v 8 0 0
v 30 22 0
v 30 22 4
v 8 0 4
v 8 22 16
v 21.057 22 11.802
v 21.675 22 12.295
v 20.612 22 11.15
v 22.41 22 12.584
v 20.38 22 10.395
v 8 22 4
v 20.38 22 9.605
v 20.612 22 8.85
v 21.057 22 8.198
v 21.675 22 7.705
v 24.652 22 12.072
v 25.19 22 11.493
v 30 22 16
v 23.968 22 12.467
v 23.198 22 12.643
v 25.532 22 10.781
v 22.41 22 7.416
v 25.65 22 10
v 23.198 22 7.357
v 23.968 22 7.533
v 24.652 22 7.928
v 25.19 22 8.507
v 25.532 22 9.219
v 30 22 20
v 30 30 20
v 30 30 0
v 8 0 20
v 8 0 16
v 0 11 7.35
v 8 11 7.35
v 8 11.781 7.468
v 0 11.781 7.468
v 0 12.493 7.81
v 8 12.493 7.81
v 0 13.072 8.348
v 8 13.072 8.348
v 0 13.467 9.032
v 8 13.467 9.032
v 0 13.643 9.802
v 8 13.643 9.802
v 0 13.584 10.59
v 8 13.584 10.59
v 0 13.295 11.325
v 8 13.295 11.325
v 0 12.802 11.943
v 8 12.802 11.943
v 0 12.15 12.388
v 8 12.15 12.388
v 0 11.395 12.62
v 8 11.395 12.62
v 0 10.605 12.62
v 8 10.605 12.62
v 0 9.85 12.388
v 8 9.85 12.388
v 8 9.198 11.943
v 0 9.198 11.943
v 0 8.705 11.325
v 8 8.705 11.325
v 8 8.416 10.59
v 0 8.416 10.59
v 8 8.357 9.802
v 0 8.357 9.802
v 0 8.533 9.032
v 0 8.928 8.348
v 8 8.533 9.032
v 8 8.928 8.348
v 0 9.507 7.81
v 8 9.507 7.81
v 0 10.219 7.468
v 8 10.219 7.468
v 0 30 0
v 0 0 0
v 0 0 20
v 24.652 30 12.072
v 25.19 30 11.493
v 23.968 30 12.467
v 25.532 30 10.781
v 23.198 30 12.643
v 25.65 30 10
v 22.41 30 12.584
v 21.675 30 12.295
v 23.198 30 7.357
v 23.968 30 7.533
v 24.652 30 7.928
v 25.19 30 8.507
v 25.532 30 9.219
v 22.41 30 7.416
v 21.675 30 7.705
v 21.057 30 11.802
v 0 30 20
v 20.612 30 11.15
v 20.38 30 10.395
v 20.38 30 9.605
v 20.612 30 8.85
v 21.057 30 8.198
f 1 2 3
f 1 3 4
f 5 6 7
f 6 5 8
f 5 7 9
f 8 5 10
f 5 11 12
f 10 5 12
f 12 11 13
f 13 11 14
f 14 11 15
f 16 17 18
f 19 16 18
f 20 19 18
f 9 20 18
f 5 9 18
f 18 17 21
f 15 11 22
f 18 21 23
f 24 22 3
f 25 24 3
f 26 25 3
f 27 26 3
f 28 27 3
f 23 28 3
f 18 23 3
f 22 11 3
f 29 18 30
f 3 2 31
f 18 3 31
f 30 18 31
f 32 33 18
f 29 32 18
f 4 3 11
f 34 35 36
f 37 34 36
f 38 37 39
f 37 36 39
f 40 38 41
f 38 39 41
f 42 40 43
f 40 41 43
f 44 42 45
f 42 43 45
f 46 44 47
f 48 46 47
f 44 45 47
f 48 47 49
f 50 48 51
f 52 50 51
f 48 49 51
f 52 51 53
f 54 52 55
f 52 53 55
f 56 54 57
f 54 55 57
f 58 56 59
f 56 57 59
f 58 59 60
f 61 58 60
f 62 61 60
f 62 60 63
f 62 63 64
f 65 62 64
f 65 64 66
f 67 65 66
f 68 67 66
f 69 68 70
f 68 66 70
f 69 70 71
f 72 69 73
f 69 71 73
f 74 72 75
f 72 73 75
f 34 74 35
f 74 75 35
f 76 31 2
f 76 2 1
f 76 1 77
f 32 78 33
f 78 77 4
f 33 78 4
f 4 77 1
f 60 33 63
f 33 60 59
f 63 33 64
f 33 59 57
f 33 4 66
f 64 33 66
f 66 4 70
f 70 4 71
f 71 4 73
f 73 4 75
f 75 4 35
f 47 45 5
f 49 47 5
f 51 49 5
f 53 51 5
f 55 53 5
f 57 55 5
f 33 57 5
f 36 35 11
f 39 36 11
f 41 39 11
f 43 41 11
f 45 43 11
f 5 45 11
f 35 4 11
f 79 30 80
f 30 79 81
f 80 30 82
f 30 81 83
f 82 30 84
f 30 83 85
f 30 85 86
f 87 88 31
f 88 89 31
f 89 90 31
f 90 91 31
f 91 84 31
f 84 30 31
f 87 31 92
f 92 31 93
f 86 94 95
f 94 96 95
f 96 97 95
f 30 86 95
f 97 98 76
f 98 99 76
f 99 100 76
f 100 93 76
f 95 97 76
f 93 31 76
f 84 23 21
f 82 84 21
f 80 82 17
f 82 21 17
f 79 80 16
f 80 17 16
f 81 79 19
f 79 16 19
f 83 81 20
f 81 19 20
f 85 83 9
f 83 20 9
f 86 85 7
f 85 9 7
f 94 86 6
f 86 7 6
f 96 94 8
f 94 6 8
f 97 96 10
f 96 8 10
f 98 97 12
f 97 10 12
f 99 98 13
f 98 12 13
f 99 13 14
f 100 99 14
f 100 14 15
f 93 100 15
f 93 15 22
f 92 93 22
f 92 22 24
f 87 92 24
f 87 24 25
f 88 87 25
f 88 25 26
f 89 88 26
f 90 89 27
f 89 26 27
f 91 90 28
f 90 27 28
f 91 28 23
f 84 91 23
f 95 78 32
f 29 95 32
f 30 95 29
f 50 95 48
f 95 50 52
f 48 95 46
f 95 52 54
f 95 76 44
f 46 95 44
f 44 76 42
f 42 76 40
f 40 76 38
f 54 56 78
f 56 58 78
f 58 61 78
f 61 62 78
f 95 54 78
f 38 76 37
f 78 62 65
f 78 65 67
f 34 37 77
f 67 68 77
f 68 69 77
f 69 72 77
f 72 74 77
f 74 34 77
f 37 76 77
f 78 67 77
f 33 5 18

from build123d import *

# Parameters (mm, degrees)
BOSS_EXTRUDE1_DEPTH = 4
BOSS_EXTRUDE2_DEPTH = 12
BOSS_EXTRUDE3_DEPTH = 4
SKETCH4_R           = 2.65
CUT_EXTRUDE1_DEPTH  = 8
SKETCH5_R           = 2.65
CUT_EXTRUDE2_DEPTH  = 8


with BuildPart() as part:
    # Sketch1 → Boss-Extrude1 (new body)
    with BuildSketch(Plane.XY):
        Polygon((0, 0), (0, 30), (30, 30), (30, 22), (8, 0), align=None)
    extrude(amount=BOSS_EXTRUDE1_DEPTH)

    # Sketch2 → Boss-Extrude2 (add)
    with BuildSketch(Plane.XY.offset(4)):
        Polygon((0, 0), (8, 0), (8, 22), (30, 22), (30, 30), (0, 30), align=None)
    extrude(amount=BOSS_EXTRUDE2_DEPTH)

    # Sketch3 → Boss-Extrude3 (add)
    with BuildSketch(Plane.XY.offset(16)):
        Polygon((0, 30), (0, 0), (8, 0), (30, 22), (30, 30), align=None)
    extrude(amount=BOSS_EXTRUDE3_DEPTH)

    # Sketch4 → Cut-Extrude1 (cut)
    with BuildSketch(Plane(origin=(8, 0, 0), x_dir=(0, 0, -1), z_dir=(1, 0, 0))):
        with Locations((-10, 11)):
            Circle(SKETCH4_R)
    extrude(amount=-CUT_EXTRUDE1_DEPTH, mode=Mode.SUBTRACT)

    # Sketch5 → Cut-Extrude2 (cut)
    with BuildSketch(Plane.XZ.offset(-22)):
        with Locations((23, 10)):
            Circle(SKETCH5_R)
    extrude(amount=-CUT_EXTRUDE2_DEPTH, mode=Mode.SUBTRACT)


solid = part.part
